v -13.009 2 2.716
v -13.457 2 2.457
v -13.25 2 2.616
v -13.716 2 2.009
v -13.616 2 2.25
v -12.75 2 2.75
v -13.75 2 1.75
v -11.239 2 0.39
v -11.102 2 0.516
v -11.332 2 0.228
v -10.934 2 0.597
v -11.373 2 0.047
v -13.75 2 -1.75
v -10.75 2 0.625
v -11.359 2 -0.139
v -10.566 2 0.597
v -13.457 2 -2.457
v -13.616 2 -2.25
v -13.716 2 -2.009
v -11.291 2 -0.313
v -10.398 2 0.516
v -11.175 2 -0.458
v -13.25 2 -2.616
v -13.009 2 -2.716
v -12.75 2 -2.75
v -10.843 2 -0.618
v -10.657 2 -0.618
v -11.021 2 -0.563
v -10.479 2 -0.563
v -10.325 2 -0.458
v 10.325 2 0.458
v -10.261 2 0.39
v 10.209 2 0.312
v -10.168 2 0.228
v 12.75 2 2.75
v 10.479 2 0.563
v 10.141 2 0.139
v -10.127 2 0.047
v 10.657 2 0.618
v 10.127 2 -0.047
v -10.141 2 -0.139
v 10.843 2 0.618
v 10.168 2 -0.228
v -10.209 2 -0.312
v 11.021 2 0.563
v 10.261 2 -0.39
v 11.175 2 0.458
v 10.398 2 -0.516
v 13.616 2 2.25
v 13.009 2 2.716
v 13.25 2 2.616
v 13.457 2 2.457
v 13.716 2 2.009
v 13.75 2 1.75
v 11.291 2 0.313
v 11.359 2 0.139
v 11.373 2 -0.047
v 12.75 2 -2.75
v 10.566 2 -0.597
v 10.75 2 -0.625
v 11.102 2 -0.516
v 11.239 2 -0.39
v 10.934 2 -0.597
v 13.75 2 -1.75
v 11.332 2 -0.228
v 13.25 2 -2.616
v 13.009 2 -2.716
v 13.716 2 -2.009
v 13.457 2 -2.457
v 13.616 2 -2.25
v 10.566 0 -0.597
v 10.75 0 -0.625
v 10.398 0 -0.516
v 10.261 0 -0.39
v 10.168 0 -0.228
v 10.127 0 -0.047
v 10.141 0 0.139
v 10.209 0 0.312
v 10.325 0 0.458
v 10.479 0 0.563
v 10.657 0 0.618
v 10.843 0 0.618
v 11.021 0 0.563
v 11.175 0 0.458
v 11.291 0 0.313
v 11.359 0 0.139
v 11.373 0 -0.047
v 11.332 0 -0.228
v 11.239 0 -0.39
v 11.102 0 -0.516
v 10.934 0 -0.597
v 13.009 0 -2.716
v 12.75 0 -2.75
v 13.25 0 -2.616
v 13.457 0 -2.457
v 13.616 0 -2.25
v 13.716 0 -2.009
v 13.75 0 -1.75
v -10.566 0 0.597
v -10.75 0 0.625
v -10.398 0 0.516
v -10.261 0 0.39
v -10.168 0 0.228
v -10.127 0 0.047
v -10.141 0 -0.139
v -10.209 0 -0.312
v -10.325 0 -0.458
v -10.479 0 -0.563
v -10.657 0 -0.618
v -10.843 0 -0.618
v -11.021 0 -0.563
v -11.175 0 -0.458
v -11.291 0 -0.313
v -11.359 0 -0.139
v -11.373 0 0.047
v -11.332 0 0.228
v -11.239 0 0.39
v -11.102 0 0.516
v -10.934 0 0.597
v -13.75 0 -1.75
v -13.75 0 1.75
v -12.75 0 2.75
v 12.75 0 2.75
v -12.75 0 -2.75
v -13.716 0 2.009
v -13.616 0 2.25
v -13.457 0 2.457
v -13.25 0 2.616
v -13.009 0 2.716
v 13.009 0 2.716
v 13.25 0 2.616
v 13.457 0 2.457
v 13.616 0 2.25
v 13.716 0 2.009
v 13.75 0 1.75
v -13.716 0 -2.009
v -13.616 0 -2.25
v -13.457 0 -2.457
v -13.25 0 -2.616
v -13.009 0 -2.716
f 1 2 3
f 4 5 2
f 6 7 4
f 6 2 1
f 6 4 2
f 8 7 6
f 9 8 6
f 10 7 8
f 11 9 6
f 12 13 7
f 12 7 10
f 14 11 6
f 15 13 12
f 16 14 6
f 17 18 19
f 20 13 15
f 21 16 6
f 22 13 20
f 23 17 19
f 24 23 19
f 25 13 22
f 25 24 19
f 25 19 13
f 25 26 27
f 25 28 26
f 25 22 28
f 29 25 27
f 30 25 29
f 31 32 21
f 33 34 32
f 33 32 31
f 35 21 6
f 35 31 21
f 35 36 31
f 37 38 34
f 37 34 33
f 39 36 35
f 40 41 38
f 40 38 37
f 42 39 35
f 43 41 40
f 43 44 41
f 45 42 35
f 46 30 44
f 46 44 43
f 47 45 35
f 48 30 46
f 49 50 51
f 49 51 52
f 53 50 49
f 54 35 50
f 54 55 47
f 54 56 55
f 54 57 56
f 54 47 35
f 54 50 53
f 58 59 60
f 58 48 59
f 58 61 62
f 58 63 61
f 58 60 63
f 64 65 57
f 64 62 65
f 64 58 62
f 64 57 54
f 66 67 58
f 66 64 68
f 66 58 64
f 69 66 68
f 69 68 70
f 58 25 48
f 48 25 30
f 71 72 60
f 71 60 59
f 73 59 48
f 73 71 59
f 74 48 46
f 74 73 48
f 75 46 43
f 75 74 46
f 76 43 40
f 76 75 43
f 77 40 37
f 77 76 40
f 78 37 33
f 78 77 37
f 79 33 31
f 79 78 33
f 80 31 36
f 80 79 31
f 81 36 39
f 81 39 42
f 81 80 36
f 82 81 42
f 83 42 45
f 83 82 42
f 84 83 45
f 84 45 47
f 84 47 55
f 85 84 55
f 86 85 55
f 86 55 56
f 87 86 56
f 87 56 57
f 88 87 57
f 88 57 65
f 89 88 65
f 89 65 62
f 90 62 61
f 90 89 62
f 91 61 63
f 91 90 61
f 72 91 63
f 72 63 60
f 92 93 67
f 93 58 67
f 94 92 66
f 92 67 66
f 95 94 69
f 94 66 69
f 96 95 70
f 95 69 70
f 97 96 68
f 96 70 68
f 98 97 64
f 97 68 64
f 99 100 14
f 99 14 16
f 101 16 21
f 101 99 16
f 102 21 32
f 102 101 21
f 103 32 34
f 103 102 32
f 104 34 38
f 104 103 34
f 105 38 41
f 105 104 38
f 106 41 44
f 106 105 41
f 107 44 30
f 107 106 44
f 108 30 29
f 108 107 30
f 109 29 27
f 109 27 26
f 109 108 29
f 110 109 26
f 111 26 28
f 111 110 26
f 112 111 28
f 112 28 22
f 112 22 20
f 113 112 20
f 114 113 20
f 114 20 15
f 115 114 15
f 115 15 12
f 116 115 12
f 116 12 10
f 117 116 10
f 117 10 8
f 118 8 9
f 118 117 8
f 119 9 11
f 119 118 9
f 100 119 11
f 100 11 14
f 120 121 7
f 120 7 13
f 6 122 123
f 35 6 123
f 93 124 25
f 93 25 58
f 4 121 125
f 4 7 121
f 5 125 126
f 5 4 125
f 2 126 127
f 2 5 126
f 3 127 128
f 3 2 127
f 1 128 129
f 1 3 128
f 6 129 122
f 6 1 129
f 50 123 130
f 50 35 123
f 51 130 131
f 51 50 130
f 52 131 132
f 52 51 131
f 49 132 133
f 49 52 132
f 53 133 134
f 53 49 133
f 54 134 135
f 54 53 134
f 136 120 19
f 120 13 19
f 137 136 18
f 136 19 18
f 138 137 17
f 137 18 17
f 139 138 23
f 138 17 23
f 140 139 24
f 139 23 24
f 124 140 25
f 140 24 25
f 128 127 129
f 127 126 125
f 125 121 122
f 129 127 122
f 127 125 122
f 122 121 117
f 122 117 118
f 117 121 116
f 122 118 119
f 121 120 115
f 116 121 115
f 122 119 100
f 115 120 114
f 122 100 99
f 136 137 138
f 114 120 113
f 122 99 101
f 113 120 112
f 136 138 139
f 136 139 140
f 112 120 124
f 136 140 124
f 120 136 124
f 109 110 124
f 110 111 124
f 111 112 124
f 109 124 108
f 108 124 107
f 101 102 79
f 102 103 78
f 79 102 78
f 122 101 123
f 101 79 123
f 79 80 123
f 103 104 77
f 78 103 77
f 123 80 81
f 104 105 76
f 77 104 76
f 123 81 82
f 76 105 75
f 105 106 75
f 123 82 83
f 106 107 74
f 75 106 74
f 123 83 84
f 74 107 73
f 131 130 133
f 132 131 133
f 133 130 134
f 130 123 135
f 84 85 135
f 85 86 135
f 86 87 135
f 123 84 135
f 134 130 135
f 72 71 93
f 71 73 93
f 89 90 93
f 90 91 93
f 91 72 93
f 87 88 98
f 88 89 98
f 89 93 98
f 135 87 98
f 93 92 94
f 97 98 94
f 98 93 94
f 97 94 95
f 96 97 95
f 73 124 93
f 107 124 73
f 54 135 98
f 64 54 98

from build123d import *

# Parameters (mm, degrees)
CROQUIS1_W              = 27.5
CROQUIS1_H              = 5.5
CROQUIS1_R              = 0.625
SALIENTE_EXTRUIR1_DEPTH = 2
REDONDEO1_R             = 1


with BuildPart() as part:
    # Croquis1 → Saliente-Extruir1 (new body)
    with BuildSketch(Plane(origin=(0, 0, 0), x_dir=(1, 0, 0), z_dir=(0, 1, 0))):
        Rectangle(CROQUIS1_W, CROQUIS1_H)
        with Locations(Location((-10.75, 0, 0), (0, 0, 270))):
            Circle(CROQUIS1_R, mode=Mode.SUBTRACT)
        with Locations(Location((10.75, 0, 0), (0, 0, 90))):
            Circle(CROQUIS1_R, mode=Mode.SUBTRACT)
    extrude(amount=SALIENTE_EXTRUIR1_DEPTH)

    # Redondeo1
    redondeo1_edges = [part.edges().sort_by_distance(p)[0] for p in [
        (13.75, 1, 2.75),
        (-13.75, 1, 2.75),
        (-13.75, 1, -2.75),
        (13.75, 1, -2.75),
    ]]
    fillet(redondeo1_edges, radius=REDONDEO1_R)


solid = part.part
